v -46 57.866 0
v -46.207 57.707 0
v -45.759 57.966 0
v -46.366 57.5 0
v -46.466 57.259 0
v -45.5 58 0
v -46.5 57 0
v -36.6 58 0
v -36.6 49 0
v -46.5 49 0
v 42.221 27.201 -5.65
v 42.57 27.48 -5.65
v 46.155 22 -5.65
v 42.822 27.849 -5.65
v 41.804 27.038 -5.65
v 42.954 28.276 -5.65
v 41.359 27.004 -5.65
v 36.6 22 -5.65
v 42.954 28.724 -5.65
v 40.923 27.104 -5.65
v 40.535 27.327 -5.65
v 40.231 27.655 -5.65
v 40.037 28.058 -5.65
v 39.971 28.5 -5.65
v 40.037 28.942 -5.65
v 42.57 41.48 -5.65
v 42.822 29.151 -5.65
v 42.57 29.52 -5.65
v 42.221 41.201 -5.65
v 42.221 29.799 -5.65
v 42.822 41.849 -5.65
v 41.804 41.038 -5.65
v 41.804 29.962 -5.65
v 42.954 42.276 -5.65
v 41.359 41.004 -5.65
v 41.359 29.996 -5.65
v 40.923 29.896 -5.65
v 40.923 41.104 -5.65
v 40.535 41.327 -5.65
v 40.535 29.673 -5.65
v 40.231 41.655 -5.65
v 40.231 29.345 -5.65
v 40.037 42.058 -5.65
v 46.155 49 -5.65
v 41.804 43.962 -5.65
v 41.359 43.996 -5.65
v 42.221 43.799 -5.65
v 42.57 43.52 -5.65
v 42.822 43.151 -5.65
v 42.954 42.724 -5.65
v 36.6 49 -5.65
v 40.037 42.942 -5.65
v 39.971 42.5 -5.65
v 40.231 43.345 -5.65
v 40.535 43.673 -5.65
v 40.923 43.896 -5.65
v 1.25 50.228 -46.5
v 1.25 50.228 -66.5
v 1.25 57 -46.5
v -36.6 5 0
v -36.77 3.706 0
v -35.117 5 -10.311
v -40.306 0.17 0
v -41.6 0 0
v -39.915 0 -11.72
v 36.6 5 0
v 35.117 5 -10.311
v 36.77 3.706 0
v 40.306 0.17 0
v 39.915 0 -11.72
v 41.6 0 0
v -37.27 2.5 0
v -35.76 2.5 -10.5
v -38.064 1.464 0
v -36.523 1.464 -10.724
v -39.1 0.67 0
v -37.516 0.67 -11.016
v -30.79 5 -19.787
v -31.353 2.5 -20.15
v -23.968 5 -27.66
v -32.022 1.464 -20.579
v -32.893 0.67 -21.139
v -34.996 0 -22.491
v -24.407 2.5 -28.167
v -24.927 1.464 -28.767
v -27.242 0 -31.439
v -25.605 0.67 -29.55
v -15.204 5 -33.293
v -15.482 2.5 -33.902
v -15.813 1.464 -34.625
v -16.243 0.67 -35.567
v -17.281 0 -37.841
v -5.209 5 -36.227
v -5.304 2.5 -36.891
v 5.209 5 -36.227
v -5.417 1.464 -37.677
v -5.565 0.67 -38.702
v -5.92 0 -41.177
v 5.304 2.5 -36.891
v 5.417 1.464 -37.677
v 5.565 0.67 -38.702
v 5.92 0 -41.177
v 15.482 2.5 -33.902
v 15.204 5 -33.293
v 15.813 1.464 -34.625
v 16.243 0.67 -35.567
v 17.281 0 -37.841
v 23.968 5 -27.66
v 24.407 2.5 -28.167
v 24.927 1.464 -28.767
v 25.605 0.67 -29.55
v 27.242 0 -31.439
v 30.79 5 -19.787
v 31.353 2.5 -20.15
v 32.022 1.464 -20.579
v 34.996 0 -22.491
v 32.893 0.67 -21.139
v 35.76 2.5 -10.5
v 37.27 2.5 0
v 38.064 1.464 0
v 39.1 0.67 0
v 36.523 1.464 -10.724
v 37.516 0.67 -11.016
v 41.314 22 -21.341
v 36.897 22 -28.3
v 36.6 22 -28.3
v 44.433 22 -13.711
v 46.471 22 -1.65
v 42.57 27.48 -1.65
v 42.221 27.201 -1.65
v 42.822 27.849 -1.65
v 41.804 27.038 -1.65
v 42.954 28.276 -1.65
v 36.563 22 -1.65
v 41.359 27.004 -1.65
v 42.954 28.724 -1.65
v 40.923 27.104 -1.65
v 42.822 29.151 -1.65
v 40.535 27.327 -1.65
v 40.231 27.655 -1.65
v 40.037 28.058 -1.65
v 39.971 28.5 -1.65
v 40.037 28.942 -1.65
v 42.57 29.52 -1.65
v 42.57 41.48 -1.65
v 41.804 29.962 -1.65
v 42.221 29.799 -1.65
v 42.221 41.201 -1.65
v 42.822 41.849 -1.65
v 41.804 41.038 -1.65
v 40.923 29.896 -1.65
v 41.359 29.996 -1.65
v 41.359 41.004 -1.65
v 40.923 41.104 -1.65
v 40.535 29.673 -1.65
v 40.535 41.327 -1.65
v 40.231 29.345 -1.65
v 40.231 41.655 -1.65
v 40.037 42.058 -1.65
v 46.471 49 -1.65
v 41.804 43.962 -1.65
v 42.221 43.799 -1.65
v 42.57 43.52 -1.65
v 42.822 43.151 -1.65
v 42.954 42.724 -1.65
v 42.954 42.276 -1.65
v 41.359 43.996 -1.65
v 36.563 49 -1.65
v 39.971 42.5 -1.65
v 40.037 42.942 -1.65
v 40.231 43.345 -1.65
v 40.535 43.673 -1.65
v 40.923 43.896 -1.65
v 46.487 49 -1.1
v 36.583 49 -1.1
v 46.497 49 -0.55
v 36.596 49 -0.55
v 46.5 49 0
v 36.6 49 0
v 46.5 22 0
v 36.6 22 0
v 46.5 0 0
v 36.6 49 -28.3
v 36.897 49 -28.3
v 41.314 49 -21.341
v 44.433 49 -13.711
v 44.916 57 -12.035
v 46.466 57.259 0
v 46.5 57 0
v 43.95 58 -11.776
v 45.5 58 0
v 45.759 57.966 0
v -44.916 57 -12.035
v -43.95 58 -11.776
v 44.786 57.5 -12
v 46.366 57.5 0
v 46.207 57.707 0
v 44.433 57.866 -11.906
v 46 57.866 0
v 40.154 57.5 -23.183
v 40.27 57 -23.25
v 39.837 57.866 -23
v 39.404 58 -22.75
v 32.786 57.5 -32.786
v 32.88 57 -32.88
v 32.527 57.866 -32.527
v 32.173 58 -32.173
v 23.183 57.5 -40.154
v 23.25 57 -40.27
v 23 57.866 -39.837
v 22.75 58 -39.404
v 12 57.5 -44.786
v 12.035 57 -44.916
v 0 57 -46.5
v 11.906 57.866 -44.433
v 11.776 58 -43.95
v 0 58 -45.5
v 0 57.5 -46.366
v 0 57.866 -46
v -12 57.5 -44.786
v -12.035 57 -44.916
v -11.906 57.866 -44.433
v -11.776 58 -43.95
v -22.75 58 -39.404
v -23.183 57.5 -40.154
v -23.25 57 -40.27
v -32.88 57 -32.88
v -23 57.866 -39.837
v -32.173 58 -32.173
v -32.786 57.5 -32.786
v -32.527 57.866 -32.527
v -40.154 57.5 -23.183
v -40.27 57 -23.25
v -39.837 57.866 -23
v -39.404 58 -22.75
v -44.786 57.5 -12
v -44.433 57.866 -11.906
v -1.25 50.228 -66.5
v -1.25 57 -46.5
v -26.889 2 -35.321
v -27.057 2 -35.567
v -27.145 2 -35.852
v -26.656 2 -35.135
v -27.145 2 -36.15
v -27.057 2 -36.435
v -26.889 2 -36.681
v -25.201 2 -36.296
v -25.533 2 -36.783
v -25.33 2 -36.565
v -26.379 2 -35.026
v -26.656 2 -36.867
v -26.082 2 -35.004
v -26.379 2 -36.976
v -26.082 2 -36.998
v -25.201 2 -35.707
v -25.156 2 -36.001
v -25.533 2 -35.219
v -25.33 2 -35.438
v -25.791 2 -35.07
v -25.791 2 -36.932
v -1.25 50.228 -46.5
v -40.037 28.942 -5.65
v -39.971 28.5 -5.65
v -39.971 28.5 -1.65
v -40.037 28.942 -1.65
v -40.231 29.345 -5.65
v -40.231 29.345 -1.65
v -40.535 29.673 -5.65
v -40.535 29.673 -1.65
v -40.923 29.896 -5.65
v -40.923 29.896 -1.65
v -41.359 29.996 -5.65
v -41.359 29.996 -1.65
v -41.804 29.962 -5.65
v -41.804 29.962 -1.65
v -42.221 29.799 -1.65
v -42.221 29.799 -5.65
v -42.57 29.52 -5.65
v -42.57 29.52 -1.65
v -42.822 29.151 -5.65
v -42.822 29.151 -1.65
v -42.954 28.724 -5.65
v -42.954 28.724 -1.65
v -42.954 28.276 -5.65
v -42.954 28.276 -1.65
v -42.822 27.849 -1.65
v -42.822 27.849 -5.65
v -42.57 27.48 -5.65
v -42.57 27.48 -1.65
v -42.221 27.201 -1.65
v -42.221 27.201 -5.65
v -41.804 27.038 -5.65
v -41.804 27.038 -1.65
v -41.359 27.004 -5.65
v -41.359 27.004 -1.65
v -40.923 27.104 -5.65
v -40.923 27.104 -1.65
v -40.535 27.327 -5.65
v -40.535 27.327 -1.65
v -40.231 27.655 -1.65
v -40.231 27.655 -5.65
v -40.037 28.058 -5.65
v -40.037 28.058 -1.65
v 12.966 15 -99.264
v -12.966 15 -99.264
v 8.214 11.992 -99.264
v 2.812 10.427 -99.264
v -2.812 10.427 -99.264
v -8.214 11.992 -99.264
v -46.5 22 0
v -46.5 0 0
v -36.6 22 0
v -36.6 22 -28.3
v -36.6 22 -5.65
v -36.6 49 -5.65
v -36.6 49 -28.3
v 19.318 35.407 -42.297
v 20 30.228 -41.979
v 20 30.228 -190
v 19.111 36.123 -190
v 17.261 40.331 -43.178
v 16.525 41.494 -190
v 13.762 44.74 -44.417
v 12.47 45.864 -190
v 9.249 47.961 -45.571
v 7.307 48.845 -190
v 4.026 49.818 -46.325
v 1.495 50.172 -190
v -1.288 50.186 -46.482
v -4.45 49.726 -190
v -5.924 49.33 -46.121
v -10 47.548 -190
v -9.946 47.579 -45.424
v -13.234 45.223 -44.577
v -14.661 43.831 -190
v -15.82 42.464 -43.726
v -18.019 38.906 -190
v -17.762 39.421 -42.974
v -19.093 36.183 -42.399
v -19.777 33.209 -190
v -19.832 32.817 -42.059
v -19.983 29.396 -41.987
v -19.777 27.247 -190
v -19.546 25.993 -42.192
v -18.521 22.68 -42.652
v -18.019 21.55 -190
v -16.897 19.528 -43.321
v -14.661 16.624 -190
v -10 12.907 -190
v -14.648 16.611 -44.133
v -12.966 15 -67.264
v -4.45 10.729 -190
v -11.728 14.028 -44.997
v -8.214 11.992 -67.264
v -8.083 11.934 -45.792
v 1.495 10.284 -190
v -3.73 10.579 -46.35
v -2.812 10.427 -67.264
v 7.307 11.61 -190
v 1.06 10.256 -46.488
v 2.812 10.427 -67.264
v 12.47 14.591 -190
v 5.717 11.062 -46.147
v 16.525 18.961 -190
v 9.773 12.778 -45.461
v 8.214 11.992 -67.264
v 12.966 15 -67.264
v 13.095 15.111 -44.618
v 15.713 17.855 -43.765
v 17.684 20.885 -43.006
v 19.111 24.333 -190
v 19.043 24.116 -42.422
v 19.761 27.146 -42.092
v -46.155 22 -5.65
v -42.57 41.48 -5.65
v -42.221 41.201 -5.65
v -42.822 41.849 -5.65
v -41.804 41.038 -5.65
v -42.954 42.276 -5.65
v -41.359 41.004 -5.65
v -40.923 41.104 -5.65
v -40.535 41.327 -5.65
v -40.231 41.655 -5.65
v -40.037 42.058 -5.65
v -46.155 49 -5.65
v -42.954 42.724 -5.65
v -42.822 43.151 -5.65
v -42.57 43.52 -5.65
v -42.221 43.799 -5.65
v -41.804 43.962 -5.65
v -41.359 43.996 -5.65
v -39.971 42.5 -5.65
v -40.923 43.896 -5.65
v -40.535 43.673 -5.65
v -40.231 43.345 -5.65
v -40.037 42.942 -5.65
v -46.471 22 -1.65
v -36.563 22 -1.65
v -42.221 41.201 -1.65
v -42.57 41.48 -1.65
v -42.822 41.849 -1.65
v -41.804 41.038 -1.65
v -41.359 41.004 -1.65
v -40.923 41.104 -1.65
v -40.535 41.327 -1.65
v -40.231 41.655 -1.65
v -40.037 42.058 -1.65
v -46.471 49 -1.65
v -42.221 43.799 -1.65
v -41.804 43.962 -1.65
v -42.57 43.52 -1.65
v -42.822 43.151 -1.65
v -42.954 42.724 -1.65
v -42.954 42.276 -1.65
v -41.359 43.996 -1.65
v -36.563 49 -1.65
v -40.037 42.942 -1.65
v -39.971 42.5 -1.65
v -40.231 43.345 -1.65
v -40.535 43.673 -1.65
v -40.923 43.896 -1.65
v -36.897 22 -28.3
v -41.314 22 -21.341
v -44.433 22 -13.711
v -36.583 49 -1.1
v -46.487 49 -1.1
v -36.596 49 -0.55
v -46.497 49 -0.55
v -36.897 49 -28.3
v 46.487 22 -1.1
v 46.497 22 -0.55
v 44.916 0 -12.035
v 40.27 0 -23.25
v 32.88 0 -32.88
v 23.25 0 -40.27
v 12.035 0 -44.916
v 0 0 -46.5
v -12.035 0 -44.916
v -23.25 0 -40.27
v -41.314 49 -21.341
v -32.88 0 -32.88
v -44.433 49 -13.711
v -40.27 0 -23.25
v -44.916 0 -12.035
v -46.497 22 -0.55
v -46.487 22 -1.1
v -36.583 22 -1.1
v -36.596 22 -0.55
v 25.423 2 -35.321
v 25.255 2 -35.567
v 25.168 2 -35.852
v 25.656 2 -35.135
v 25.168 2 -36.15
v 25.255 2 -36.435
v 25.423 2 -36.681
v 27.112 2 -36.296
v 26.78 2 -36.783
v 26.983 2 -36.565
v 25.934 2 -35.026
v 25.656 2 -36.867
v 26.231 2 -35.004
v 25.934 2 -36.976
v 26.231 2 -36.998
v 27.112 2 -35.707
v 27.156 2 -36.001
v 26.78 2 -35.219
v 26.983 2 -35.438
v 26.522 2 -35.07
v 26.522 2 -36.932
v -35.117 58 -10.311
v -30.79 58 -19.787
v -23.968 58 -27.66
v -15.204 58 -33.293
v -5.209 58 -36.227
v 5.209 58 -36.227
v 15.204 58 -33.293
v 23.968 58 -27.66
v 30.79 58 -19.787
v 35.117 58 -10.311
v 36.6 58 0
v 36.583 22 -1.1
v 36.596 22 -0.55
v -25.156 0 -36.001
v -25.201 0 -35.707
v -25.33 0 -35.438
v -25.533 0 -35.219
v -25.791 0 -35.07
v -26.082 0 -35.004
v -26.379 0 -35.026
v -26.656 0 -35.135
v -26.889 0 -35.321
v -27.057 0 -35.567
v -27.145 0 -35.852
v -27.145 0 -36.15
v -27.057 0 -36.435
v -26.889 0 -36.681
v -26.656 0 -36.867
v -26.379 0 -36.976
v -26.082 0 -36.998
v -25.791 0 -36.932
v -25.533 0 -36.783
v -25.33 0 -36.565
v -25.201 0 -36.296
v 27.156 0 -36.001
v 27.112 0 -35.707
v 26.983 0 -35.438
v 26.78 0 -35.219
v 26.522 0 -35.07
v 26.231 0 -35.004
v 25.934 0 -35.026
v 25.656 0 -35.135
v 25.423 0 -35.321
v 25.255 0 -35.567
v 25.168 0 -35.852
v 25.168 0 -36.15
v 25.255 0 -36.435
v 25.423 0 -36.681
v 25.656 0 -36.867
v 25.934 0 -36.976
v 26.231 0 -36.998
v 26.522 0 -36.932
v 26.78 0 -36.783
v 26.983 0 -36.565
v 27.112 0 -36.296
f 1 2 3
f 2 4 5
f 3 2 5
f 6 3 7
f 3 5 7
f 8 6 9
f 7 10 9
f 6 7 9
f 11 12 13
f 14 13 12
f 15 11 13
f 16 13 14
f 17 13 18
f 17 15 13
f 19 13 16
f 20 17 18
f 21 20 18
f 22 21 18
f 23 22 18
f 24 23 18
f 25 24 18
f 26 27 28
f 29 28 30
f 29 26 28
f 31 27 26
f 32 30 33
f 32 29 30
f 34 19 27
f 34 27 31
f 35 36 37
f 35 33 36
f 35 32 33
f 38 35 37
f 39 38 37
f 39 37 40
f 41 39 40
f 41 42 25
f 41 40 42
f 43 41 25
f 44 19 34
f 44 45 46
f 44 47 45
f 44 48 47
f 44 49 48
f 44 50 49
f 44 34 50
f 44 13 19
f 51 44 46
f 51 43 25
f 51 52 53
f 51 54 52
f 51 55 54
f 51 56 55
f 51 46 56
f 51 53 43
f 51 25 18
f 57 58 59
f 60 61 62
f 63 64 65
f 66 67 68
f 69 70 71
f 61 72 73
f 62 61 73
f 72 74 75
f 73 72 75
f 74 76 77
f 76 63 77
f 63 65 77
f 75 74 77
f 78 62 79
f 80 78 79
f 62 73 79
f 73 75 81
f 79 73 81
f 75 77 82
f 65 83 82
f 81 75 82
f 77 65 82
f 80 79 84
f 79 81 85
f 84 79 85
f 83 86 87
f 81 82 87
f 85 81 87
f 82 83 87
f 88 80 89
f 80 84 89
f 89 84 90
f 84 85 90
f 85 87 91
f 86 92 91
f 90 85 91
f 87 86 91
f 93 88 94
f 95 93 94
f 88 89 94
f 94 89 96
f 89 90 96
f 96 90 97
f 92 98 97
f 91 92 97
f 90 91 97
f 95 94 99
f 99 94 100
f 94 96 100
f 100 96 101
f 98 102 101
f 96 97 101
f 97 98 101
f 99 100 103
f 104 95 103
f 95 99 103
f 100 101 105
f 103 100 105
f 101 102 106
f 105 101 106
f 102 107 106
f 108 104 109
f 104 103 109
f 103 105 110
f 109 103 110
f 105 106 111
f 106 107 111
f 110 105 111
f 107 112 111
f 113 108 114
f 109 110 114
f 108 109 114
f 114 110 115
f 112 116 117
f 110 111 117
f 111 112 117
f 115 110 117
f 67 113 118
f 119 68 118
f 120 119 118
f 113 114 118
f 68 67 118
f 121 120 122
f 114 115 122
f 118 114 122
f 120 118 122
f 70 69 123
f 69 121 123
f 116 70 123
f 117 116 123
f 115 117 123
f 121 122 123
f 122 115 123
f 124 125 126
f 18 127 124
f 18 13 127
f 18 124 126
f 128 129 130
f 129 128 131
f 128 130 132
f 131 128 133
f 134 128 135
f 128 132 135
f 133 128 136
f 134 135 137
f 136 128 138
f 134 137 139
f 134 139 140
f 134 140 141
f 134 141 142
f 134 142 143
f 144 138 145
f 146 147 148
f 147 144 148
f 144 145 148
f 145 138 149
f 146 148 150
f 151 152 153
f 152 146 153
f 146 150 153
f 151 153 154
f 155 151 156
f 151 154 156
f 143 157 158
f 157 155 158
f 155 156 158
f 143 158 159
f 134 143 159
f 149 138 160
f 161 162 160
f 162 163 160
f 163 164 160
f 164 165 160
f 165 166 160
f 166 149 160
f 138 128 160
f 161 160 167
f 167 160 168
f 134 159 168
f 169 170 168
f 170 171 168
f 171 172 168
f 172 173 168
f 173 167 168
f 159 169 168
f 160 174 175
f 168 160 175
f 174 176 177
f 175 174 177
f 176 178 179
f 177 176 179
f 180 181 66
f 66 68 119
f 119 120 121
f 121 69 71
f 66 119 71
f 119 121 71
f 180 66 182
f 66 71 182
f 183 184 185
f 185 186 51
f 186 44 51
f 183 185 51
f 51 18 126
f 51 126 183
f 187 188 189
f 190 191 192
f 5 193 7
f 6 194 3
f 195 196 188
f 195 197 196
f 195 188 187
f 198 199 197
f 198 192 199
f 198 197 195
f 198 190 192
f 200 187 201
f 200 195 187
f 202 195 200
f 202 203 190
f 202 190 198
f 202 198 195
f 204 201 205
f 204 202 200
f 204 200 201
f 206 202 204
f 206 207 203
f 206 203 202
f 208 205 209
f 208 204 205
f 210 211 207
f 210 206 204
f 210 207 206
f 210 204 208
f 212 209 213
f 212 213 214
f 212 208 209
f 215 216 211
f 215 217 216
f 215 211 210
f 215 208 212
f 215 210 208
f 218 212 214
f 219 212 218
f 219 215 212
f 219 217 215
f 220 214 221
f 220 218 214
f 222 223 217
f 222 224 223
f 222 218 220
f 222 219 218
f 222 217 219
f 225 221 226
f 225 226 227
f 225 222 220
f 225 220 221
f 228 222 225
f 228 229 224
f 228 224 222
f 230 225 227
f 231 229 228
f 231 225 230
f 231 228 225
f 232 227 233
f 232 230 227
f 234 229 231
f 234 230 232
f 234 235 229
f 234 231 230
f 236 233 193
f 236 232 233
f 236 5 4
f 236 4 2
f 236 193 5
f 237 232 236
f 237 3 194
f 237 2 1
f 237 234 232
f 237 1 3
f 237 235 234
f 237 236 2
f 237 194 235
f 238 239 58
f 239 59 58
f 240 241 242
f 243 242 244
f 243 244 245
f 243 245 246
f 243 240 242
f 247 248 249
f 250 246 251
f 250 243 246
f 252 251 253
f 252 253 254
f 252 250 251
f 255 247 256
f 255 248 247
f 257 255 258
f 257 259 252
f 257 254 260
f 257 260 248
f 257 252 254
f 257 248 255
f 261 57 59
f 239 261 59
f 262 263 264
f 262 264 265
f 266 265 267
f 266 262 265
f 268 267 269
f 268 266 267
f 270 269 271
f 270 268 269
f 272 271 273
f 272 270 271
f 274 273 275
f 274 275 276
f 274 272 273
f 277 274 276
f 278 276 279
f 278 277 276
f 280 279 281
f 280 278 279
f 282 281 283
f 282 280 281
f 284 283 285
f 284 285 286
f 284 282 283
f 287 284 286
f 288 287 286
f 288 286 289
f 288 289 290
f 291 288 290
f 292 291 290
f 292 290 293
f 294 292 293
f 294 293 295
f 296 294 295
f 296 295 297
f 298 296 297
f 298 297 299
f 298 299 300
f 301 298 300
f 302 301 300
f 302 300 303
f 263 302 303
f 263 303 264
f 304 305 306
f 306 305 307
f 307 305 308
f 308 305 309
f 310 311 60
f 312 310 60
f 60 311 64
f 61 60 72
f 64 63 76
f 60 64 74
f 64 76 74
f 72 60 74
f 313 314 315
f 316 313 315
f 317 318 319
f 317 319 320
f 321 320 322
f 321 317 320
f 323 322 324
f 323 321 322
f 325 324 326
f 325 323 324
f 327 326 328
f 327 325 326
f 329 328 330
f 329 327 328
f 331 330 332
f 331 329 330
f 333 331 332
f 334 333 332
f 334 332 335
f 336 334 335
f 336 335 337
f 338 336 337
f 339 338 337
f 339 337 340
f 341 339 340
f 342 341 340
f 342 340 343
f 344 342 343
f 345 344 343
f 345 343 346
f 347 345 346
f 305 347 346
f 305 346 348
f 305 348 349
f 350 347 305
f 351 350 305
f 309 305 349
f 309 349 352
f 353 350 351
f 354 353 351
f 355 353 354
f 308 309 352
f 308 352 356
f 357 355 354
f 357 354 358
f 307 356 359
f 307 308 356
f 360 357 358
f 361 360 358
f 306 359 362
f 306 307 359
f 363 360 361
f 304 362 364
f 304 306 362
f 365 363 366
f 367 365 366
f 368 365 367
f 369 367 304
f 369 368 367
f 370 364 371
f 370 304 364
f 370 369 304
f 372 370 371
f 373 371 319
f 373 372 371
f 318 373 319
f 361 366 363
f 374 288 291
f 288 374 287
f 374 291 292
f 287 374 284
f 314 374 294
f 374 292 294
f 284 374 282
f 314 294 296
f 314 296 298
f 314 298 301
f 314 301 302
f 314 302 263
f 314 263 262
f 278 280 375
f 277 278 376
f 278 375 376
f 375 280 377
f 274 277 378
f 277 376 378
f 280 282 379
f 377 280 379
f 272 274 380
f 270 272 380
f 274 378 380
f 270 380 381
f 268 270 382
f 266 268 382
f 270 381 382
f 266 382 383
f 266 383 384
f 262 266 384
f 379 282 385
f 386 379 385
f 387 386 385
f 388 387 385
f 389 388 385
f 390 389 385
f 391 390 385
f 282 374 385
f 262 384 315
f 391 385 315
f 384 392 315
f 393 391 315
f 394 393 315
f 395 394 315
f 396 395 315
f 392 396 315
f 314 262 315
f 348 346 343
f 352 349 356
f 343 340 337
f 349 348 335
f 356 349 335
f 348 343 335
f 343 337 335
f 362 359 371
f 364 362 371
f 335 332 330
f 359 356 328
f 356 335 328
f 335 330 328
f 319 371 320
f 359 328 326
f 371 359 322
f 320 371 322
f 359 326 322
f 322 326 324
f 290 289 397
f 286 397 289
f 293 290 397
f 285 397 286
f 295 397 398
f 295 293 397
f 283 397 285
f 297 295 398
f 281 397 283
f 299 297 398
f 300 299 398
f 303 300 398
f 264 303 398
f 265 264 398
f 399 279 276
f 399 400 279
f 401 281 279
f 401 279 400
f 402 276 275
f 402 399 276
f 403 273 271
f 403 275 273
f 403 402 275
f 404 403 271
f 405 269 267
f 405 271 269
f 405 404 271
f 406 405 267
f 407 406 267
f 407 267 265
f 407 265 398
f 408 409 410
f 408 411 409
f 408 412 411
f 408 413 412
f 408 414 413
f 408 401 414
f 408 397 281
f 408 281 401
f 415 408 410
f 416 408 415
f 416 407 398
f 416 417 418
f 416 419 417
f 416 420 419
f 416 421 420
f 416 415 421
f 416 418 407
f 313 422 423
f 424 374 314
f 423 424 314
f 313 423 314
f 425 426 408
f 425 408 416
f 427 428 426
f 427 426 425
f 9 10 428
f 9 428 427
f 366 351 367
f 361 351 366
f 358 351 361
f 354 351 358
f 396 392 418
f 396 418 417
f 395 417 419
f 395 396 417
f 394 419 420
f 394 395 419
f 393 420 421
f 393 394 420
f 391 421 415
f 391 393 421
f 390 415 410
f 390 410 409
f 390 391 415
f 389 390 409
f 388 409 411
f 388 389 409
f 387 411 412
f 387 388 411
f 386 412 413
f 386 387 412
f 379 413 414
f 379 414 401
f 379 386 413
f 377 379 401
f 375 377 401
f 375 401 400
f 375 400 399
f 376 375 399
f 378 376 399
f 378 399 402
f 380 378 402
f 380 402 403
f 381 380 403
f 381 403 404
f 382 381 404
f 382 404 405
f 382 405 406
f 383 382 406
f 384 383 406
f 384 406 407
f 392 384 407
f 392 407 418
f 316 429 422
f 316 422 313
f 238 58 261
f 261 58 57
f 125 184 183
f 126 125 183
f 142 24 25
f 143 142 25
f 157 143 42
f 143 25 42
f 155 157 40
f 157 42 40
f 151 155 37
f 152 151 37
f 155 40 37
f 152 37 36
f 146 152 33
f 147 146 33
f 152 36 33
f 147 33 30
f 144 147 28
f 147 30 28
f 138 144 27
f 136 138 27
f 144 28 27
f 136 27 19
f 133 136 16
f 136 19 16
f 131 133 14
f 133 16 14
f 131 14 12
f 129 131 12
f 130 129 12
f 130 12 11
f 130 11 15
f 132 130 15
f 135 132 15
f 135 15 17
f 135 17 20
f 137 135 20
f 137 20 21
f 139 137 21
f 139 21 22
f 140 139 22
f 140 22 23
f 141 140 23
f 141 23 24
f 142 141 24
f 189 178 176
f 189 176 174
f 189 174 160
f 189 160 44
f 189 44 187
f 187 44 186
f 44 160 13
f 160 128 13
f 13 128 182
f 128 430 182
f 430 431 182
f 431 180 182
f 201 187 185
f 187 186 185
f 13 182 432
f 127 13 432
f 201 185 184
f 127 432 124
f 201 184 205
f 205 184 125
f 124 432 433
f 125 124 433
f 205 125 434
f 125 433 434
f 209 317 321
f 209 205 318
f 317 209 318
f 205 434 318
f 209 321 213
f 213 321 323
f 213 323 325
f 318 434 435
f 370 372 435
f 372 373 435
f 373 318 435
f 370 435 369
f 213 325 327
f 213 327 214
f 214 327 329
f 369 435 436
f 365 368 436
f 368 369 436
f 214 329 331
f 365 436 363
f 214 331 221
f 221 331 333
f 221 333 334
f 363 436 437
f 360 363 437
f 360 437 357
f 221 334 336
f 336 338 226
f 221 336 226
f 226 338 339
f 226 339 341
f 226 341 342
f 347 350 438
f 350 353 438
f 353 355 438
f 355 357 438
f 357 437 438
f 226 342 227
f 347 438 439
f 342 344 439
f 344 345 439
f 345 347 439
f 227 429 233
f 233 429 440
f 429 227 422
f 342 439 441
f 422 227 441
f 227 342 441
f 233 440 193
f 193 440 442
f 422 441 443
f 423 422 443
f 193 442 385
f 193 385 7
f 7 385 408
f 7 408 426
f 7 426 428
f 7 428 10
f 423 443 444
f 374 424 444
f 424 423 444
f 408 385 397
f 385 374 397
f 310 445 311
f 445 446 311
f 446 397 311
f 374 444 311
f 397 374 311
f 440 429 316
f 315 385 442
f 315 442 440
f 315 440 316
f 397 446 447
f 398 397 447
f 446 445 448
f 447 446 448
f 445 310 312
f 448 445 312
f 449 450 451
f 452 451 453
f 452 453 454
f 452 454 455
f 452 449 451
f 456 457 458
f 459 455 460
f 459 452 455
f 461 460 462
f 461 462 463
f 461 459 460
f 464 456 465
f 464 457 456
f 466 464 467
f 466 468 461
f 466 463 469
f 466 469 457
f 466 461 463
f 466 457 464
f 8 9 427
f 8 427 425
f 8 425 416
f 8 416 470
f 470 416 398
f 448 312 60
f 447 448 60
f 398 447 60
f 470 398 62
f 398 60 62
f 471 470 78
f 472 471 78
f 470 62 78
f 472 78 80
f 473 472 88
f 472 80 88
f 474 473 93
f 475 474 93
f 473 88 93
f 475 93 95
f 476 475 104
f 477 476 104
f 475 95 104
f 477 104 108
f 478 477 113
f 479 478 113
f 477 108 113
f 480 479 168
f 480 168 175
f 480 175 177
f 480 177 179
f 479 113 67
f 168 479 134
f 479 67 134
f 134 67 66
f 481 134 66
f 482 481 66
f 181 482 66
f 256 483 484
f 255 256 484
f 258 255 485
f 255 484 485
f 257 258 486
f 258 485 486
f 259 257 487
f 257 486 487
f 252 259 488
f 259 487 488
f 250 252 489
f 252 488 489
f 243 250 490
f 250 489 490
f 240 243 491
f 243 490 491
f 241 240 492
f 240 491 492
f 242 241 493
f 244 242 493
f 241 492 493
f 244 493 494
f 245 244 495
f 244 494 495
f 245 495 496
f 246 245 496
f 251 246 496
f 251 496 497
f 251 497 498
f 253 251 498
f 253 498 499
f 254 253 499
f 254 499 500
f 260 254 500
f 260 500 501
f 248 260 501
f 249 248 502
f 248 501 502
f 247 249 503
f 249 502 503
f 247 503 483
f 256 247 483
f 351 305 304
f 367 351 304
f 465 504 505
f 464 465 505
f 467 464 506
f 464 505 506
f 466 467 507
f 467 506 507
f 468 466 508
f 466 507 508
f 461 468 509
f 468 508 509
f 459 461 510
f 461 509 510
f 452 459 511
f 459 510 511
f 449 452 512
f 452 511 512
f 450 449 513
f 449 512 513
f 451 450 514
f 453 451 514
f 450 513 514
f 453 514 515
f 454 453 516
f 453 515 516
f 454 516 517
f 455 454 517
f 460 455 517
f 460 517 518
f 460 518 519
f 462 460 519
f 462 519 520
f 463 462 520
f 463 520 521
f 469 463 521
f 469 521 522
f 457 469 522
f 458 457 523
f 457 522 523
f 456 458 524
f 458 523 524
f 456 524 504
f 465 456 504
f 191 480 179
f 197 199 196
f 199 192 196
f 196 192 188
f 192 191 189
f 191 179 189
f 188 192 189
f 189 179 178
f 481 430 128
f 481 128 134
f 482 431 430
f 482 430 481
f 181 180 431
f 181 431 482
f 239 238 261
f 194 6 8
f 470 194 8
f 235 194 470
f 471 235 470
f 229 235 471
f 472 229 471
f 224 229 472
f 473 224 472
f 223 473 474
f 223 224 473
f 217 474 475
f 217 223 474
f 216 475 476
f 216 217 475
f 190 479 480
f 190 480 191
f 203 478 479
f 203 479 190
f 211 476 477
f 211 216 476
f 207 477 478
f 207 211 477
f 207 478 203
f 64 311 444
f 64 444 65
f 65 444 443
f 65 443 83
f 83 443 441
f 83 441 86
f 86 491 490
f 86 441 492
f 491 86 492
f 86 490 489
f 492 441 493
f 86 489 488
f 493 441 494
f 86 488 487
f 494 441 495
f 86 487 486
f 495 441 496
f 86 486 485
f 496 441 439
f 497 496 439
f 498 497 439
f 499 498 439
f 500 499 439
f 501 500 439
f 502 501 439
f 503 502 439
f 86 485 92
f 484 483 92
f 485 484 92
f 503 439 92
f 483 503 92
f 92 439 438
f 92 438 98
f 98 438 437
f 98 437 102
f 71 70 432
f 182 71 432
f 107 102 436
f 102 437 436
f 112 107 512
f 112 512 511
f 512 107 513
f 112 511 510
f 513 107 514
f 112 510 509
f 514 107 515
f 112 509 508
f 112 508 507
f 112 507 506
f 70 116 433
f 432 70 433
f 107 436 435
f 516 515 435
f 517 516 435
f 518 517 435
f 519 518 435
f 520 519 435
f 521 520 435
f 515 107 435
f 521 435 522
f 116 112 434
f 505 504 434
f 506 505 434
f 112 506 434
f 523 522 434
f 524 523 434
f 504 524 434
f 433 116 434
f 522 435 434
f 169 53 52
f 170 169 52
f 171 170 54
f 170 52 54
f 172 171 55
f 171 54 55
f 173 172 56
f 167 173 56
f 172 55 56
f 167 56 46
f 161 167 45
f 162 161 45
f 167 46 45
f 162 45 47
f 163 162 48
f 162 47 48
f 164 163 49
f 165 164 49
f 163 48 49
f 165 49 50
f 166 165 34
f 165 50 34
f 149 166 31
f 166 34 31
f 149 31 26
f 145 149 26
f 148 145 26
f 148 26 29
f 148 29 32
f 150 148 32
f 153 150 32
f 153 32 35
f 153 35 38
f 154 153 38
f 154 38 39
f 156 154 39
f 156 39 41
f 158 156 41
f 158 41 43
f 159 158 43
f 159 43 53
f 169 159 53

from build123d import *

# Parameters (mm, degrees)
EXTRUDE_1_DEPTH     = 58
FILLET_1_R          = 5
SKETCH_2_W          = 14.1984483
SKETCH_2_H          = 27
CUT_EXTRUDE_1_DEPTH = 1.65
CUT_EXTRUDE_START   = -22.111141
SKETCH_3_R          = 1.5
CUT_EXTRUDE_2_DEPTH = 22.111141
SKETCH_5_W          = 9.9
SKETCH_5_H          = 27
CUT_EXTRUDE_3_DEPTH = 22.65
SKETCH_7_R          = 20
EXTRUDE_2_DEPTH     = 150
CUT_EXTRUDE_START_2 = 15
SKETCH_9_W          = 36
SKETCH_9_H          = 32
CUT_EXTRUDE_5_DEPTH = 8
SKETCH_10_R         = 1
CUT_EXTRUDE_6_DEPTH = 2
FILLET_2_R          = 1
EXTRUDE_3_DEPTH     = 1.25


with BuildPart() as part:
    # 草图1 → 凸台-拉伸1 (new body)
    with BuildSketch(Plane(origin=(0, 0, 0), x_dir=(1, 0, 0), z_dir=(0, 1, 0))):
        with BuildLine():
            Line((-46.5, 0), (-36.6, 0))
            ThreePointArc((-36.6, 0), (0, 36.6), (36.6, 0))
            Line((36.6, 0), (46.5, 0))
            ThreePointArc((46.5, 0), (0, 46.5), (-46.5, 0))
        make_face()
    extrude(amount=EXTRUDE_1_DEPTH)

    # 圆角1
    fillet_1_edges = [part.edges().sort_by_distance(p)[0] for p in [
        (0, 0, -36.6),
    ]]
    fillet(fillet_1_edges, radius=FILLET_1_R)

    # 草图2 → 切除-拉伸1 (cut)
    with BuildSketch(Plane.XY):
        with Locations((-41.149885232, 35.5)):
            Rectangle(SKETCH_2_W, SKETCH_2_H)
    cut_extrude_1 = extrude(amount=-CUT_EXTRUDE_1_DEPTH, mode=Mode.SUBTRACT)

    # 草图3 → 切除-拉伸2 (cut)
    with BuildSketch(Plane.XY.offset(-1.65).offset(CUT_EXTRUDE_START)):
        with Locations((-41.470716586, 28.5)):
            Circle(SKETCH_3_R)
        with Locations((-41.470716586, 42.5)):
            Circle(SKETCH_3_R)
    cut_extrude_2 = extrude(amount=CUT_EXTRUDE_2_DEPTH, mode=Mode.SUBTRACT)

    # 草图5 → 切除-拉伸3 (cut)
    with BuildSketch(Plane.XY.offset(-5.65)):
        with Locations((-41.55, 35.5)):
            Rectangle(SKETCH_5_W, SKETCH_5_H)
    cut_extrude_3 = extrude(amount=-CUT_EXTRUDE_3_DEPTH, mode=Mode.SUBTRACT)

    # 镜向2: 切除-拉伸1, 切除-拉伸2, 切除-拉伸3 across plane
    add(cut_extrude_1.mirror(Plane(origin=(0, 0, 0), x_dir=(0, 0, 1), z_dir=(1, 0, 0))), mode=Mode.SUBTRACT)
    add(cut_extrude_2.mirror(Plane(origin=(0, 0, 0), x_dir=(0, 0, 1), z_dir=(1, 0, 0))), mode=Mode.SUBTRACT)
    add(cut_extrude_3.mirror(Plane(origin=(0, 0, 0), x_dir=(0, 0, 1), z_dir=(1, 0, 0))), mode=Mode.SUBTRACT)

    # 草图7 → 凸台-拉伸2 (add)
    with BuildSketch(Plane.XY.offset(-40)):
        with Locations((0, 30.227868372)):
            Circle(SKETCH_7_R)
    extrude(amount=-EXTRUDE_2_DEPTH)

    # 草图9 → 切除-拉伸5 (cut)
    with BuildSketch(Plane(origin=(0, 0, 0), x_dir=(1, 0, 0), z_dir=(0, 1, 0)).offset(CUT_EXTRUDE_START_2)):
        with Locations((0, 83.263825199)):
            Rectangle(SKETCH_9_W, SKETCH_9_H)
    extrude(amount=-CUT_EXTRUDE_5_DEPTH, mode=Mode.SUBTRACT)

    # 草图10 → 切除-拉伸6 (cut)
    with BuildSketch(Plane.XZ):
        with Locations((-26.156443727, -36.00125625)):
            Circle(SKETCH_10_R)
        with Locations((26.156443727, -36.00125625)):
            Circle(SKETCH_10_R)
    extrude(amount=-CUT_EXTRUDE_6_DEPTH, mode=Mode.SUBTRACT)

    # 圆角2
    fillet_2_edges = [part.edges().sort_by_distance(p)[0] for p in [
        (0, 58, -46.5),
    ]]
    fillet(fillet_2_edges, radius=FILLET_2_R)


with BuildPart() as body_2:
    # 草图11 → 凸台-拉伸3 (new body, symmetric)
    with BuildSketch(Plane(origin=(0, 0, 0), x_dir=(0, 0, -1), z_dir=(1, 0, 0))):
        Polygon((46.5, 50.227868372), (46.5, 57), (66.5, 50.227868372), align=None)
    extrude(amount=EXTRUDE_3_DEPTH, both=True)


solid = Compound([part.part, body_2.part])
